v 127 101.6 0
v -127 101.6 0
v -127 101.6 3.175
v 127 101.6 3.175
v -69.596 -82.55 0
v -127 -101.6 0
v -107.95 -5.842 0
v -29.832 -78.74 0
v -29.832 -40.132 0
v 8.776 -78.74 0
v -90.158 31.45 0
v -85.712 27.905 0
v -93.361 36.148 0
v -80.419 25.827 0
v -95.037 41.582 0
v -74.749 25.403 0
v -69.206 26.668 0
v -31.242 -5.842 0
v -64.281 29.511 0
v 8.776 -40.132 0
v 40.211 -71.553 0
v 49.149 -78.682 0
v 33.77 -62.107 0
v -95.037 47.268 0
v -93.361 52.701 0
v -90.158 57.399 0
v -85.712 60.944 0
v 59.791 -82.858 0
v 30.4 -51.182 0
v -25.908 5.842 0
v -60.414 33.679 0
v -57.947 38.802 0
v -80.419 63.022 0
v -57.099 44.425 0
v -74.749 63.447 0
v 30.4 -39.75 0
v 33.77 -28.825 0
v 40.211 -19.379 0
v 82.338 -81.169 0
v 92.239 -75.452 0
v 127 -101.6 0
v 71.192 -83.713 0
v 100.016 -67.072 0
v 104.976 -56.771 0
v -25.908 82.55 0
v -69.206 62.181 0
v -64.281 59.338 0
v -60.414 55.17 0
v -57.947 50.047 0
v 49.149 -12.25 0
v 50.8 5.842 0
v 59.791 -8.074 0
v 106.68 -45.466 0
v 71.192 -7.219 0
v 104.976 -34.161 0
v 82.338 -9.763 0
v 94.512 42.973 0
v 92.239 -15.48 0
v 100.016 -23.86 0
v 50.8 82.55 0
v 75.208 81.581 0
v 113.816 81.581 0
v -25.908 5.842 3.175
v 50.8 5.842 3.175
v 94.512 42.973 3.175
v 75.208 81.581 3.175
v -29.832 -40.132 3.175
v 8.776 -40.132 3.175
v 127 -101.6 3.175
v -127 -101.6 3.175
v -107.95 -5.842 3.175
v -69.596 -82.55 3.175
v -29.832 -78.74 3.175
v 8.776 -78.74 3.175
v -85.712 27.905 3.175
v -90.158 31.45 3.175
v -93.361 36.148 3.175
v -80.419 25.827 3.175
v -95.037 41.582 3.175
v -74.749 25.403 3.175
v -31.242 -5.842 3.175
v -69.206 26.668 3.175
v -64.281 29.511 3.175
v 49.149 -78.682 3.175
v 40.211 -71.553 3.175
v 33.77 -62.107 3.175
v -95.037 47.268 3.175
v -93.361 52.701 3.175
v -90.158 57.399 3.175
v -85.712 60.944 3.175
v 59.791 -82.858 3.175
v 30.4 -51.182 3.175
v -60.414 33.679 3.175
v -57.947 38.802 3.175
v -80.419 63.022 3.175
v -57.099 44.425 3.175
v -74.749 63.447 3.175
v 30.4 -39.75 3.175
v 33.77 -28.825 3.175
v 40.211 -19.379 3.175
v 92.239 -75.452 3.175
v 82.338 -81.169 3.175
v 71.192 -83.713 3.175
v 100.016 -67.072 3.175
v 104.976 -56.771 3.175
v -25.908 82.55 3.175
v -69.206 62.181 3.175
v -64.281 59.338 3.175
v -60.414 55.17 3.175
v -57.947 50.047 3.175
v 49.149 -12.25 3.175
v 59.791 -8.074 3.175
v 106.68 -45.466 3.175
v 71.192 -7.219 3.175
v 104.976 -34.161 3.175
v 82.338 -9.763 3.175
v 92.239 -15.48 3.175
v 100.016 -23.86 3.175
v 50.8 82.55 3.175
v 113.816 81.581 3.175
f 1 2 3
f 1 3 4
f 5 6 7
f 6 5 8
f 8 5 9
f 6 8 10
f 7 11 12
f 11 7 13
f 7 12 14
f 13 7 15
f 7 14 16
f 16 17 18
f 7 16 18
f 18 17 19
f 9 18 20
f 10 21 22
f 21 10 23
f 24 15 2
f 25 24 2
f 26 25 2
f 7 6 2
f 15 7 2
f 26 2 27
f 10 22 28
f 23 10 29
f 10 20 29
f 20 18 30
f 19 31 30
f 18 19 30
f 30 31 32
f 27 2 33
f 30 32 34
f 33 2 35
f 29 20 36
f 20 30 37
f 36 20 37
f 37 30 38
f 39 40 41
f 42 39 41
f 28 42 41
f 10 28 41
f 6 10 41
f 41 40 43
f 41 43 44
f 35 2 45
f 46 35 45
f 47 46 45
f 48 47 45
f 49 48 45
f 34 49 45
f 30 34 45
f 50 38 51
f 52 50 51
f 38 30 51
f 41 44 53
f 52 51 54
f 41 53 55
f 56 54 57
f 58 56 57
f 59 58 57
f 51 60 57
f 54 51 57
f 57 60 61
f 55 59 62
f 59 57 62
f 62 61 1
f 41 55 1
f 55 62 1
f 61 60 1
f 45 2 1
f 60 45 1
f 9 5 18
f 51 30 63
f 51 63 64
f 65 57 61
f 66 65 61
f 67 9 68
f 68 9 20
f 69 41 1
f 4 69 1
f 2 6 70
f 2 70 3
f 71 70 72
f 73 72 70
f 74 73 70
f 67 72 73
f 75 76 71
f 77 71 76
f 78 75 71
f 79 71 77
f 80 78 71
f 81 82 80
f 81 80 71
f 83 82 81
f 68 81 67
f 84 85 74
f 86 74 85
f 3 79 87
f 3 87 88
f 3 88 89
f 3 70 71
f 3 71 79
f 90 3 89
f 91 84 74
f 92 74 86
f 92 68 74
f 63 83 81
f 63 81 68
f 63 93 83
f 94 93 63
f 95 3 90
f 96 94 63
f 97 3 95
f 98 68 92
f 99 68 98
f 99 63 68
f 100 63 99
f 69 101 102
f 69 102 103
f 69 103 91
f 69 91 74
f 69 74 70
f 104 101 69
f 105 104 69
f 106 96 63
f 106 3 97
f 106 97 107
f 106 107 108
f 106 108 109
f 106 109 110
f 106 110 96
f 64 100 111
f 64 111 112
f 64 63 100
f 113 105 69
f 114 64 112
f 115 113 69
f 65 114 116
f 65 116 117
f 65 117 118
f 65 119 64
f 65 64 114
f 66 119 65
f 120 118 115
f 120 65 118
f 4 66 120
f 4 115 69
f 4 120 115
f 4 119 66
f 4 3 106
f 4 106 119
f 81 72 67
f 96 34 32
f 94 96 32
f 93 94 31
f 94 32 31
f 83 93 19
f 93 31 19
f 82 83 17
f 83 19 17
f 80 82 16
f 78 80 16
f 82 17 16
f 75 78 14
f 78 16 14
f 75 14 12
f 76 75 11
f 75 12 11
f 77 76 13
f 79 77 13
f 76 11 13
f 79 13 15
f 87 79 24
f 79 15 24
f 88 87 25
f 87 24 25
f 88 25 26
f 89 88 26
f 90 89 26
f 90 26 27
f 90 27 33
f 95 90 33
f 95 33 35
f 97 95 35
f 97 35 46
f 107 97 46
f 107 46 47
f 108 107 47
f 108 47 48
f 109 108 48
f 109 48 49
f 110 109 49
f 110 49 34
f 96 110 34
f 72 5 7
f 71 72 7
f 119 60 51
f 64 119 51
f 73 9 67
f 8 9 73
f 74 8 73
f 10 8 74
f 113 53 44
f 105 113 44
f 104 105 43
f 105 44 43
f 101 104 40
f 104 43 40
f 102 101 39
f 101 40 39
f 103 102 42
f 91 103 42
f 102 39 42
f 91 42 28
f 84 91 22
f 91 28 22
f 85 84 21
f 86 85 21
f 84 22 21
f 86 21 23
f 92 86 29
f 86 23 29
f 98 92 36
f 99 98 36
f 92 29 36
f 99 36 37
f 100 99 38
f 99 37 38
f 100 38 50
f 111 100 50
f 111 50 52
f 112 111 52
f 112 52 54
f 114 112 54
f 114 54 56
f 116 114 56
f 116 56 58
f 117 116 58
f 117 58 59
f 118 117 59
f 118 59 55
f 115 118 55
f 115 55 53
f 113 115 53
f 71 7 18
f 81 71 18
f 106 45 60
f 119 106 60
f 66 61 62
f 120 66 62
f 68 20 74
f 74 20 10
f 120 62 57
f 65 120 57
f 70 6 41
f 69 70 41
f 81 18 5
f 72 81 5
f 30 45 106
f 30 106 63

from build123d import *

# Parameters (mm, degrees)
F0_W      = 254
F0_H      = 203.2
F1_DEPTH  = 3.175
F3_DEPTH  = 25.4
F4_W      = 76.708
F4_H      = 76.708
F5_DEPTH  = 25.4
F6_R      = 38.354
F7_DEPTH  = 25.4
F9_DEPTH  = 25.4
F10_R     = 19.0754
F11_DEPTH = 25.4
F12_W     = 38.608
F12_H     = 38.608
F13_DEPTH = 25.4


with BuildPart() as f1:
    # F0 (on Top) → F1 (new body)
    with BuildSketch(Plane.XY):
        Rectangle(F0_W, F0_H)
    extrude(amount=F1_DEPTH)

    # F2 (on face) → F3 (cut)
    with BuildSketch(Plane(origin=(0, 0, 0), x_dir=(1, 0, 0), z_dir=(0, 0, -1))):
        Polygon((-69.596, 82.55), (-107.95, 5.842), (-31.242, 5.842), align=None)
    extrude(amount=-F3_DEPTH, mode=Mode.SUBTRACT)

    # F4 (on face) → F5 (cut)
    with BuildSketch(Plane(origin=(0, 0, 0), x_dir=(1, 0, 0), z_dir=(0, 0, -1))):
        with Locations((12.446, -44.196)):
            Rectangle(F4_W, F4_H)
    extrude(amount=-F5_DEPTH, mode=Mode.SUBTRACT)

    # F6 (on face) → F7 (cut)
    with BuildSketch(Plane(origin=(0, 0, 0), x_dir=(1, 0, 0), z_dir=(0, 0, -1))):
        with Locations((68.326, 45.466)):
            Circle(F6_R)
    extrude(amount=-F7_DEPTH, mode=Mode.SUBTRACT)

    # F8 (on face) → F9 (cut)
    with BuildSketch(Plane(origin=(0, 0, 0), x_dir=(1, 0, 0), z_dir=(0, 0, -1))):
        Polygon((94.512347, -42.973466), (75.208347, -81.581466), (113.816347, -81.581466), align=None)
    extrude(amount=-F9_DEPTH, mode=Mode.SUBTRACT)

    # F10 (on face) → F11 (cut)
    with BuildSketch(Plane(origin=(0, 0, 0), x_dir=(1, 0, 0), z_dir=(0, 0, -1))):
        with Locations((-76.1746, -44.4246)):
            Circle(F10_R)
    extrude(amount=-F11_DEPTH, mode=Mode.SUBTRACT)

    # F12 (on face) → F13 (cut)
    with BuildSketch(Plane(origin=(0, 0, 0), x_dir=(1, 0, 0), z_dir=(0, 0, -1))):
        with Locations((-10.528486, 59.436)):
            Rectangle(F12_W, F12_H)
    extrude(amount=-F13_DEPTH, mode=Mode.SUBTRACT)


solid = f1.part
